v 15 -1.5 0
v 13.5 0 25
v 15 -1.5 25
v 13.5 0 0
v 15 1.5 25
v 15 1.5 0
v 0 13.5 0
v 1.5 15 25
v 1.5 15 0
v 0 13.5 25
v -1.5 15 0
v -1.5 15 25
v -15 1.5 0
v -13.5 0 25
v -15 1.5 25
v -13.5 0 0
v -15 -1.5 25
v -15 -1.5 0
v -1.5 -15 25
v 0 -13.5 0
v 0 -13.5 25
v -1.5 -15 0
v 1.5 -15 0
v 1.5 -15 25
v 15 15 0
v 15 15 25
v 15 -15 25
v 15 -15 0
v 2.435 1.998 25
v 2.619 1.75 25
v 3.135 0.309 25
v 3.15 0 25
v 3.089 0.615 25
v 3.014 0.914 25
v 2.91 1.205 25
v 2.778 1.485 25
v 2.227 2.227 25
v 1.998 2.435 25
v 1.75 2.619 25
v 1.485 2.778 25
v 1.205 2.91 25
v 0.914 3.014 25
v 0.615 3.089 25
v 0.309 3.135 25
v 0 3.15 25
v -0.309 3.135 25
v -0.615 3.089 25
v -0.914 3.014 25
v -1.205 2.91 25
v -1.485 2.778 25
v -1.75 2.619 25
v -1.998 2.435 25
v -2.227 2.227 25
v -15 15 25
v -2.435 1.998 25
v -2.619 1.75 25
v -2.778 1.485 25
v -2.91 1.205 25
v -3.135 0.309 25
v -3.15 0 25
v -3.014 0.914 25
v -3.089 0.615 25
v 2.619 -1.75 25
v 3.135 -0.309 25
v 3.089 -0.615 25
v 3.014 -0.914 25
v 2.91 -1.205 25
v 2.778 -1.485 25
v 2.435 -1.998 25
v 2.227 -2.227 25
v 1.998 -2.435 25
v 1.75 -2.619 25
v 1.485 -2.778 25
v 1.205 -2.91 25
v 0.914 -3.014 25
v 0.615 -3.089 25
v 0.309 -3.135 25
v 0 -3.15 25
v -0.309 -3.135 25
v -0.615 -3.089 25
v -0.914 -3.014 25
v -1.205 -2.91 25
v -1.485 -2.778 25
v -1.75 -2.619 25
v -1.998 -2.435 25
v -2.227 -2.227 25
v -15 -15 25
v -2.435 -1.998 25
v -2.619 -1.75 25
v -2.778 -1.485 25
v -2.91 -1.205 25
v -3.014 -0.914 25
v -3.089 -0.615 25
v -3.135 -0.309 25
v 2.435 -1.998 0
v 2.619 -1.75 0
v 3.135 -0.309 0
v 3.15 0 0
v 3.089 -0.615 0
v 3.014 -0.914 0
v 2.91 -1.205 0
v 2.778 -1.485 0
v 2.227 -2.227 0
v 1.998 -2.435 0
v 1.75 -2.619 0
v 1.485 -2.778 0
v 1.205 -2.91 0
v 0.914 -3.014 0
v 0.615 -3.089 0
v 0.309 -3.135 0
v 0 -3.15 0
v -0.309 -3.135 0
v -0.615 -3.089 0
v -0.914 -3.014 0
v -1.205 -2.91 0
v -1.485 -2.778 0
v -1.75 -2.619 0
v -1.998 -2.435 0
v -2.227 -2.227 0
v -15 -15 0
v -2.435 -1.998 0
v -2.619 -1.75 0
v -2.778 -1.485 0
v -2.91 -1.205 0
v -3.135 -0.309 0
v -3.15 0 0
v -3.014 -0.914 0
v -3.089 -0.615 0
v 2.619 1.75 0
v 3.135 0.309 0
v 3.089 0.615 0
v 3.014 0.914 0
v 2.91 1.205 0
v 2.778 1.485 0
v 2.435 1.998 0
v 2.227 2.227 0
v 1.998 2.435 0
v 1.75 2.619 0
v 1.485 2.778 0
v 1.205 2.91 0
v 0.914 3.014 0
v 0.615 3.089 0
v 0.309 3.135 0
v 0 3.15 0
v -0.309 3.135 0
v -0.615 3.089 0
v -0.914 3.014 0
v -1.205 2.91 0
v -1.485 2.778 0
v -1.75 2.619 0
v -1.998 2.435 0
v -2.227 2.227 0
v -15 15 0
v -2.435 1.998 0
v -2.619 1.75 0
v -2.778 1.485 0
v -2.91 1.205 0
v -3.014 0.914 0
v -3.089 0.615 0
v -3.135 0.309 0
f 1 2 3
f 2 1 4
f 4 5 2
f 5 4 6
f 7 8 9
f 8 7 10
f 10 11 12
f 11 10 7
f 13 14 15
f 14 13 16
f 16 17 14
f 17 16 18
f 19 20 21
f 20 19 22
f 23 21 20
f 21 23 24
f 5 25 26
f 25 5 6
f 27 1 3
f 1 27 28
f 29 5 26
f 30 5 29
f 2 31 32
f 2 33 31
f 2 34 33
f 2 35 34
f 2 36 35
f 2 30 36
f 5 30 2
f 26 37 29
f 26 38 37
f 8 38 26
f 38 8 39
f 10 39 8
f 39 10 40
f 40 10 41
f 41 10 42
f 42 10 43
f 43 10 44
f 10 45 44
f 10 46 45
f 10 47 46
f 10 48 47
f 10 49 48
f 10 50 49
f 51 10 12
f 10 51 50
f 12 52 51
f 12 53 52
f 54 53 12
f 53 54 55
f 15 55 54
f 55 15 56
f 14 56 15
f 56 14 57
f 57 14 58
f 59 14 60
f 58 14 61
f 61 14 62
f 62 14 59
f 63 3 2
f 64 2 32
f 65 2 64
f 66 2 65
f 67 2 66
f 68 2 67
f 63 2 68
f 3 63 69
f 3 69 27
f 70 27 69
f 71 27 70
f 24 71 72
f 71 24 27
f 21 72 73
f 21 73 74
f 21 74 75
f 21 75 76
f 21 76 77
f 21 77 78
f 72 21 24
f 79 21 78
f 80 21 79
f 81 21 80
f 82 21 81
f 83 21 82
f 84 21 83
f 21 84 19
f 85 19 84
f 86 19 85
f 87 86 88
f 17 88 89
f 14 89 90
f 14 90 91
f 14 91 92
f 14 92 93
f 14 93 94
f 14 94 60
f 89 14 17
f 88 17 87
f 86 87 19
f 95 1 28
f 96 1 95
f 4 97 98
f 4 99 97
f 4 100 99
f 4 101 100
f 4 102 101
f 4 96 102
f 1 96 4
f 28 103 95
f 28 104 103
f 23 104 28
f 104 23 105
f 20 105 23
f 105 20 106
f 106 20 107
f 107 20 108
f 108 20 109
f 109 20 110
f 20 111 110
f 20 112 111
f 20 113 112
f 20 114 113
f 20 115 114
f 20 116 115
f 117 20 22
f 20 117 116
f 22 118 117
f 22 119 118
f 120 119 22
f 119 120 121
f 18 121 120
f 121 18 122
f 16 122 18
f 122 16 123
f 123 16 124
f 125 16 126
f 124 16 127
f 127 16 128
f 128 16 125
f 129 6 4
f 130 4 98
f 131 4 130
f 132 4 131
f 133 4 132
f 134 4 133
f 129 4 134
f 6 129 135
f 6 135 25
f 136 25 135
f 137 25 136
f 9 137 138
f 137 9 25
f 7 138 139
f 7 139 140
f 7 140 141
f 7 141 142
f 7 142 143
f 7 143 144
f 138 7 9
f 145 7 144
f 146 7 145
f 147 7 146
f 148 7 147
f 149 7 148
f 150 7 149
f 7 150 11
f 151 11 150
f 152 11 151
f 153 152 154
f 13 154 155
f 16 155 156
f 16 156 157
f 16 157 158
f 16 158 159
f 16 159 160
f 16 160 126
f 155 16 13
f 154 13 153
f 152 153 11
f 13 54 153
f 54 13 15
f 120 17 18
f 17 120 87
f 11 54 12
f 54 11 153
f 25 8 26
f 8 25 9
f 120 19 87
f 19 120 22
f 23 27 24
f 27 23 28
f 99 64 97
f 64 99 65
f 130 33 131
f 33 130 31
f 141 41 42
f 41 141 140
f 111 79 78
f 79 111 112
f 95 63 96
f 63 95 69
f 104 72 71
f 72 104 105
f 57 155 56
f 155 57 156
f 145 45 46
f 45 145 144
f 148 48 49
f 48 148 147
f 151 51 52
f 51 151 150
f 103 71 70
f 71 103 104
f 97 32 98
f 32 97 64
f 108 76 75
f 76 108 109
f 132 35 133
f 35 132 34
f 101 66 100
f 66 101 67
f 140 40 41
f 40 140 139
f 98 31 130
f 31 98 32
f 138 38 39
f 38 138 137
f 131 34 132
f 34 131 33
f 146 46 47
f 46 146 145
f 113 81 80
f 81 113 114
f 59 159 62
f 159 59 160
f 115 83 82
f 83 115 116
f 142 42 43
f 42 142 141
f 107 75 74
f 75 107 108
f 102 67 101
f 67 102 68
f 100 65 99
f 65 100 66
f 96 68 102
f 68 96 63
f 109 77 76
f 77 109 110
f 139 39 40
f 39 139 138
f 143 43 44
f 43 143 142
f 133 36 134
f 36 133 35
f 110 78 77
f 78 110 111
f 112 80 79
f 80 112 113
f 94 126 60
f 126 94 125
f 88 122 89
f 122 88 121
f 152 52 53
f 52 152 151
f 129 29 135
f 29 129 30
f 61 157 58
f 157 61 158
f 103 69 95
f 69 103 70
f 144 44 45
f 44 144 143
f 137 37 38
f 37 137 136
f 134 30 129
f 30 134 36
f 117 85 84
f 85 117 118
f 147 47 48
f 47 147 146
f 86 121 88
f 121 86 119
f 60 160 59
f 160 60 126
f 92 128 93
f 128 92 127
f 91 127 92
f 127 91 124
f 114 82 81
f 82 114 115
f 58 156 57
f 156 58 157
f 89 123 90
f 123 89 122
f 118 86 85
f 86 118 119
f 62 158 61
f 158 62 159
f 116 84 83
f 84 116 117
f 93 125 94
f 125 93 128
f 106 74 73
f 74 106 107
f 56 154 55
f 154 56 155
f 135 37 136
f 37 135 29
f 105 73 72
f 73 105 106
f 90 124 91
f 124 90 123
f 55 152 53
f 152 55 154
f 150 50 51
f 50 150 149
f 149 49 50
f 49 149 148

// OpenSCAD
// Drill guide jig
// Hope Arising EPICS team (ASU) - original design. License: CC BY 4.0 (commercial use allowed).
// Hold it on the work and drill through the hole to get a straight, centred hole.
// The side notches line up with pencil marks. The V-groove sits on round rods and pipes.
// Plastic wears with use: fine for a few dozen holes, not for production drilling.
// Prints flat side down, no supports. Use the Strong setting.

/* [Size] */
// Diameter of the drill bit
drill_diameter = 6;        // [2:0.5:13]
// Height of the guide. Taller keeps the drill straighter.
guide_height = 25;         // [10:1:50]
// Width of the block
block_width = 30;          // [20:1:70]

/* [Options] */
// Bottom shape
bottom = 0;                // [0:Flat, 1:V-groove for round rods]

/* [Hidden] */
$fn = 64;
hole_clearance = 0.3;
notch = 1.5;

module drill_guide_jig() {
    w = max(block_width, drill_diameter + 12);
    h = guide_height;
    groove = min(w * 0.35, h * 0.4);       // depth of the V-groove
    difference() {
        translate([-w / 2, -w / 2, 0]) cube([w, w, h]);
        // guide hole
        translate([0, 0, -1]) cylinder(h = h + 2, d = drill_diameter + hole_clearance);
        // centre notches on the four sides, full height
        for (a = [0 : 90 : 270]) rotate(a)
            translate([w / 2, 0, h / 2]) rotate(45) cube([notch * 1.414, notch * 1.414, h + 2], center = true);
        // V-groove across the bottom (45 degree sides print without support)
        if (bottom == 1)
            translate([0, 0, 0]) rotate([90, 0, 0])
                linear_extrude(height = w + 2, center = true)
                    polygon([[-groove, -1], [groove, -1], [0, groove]]);
    }
}

drill_guide_jig();
